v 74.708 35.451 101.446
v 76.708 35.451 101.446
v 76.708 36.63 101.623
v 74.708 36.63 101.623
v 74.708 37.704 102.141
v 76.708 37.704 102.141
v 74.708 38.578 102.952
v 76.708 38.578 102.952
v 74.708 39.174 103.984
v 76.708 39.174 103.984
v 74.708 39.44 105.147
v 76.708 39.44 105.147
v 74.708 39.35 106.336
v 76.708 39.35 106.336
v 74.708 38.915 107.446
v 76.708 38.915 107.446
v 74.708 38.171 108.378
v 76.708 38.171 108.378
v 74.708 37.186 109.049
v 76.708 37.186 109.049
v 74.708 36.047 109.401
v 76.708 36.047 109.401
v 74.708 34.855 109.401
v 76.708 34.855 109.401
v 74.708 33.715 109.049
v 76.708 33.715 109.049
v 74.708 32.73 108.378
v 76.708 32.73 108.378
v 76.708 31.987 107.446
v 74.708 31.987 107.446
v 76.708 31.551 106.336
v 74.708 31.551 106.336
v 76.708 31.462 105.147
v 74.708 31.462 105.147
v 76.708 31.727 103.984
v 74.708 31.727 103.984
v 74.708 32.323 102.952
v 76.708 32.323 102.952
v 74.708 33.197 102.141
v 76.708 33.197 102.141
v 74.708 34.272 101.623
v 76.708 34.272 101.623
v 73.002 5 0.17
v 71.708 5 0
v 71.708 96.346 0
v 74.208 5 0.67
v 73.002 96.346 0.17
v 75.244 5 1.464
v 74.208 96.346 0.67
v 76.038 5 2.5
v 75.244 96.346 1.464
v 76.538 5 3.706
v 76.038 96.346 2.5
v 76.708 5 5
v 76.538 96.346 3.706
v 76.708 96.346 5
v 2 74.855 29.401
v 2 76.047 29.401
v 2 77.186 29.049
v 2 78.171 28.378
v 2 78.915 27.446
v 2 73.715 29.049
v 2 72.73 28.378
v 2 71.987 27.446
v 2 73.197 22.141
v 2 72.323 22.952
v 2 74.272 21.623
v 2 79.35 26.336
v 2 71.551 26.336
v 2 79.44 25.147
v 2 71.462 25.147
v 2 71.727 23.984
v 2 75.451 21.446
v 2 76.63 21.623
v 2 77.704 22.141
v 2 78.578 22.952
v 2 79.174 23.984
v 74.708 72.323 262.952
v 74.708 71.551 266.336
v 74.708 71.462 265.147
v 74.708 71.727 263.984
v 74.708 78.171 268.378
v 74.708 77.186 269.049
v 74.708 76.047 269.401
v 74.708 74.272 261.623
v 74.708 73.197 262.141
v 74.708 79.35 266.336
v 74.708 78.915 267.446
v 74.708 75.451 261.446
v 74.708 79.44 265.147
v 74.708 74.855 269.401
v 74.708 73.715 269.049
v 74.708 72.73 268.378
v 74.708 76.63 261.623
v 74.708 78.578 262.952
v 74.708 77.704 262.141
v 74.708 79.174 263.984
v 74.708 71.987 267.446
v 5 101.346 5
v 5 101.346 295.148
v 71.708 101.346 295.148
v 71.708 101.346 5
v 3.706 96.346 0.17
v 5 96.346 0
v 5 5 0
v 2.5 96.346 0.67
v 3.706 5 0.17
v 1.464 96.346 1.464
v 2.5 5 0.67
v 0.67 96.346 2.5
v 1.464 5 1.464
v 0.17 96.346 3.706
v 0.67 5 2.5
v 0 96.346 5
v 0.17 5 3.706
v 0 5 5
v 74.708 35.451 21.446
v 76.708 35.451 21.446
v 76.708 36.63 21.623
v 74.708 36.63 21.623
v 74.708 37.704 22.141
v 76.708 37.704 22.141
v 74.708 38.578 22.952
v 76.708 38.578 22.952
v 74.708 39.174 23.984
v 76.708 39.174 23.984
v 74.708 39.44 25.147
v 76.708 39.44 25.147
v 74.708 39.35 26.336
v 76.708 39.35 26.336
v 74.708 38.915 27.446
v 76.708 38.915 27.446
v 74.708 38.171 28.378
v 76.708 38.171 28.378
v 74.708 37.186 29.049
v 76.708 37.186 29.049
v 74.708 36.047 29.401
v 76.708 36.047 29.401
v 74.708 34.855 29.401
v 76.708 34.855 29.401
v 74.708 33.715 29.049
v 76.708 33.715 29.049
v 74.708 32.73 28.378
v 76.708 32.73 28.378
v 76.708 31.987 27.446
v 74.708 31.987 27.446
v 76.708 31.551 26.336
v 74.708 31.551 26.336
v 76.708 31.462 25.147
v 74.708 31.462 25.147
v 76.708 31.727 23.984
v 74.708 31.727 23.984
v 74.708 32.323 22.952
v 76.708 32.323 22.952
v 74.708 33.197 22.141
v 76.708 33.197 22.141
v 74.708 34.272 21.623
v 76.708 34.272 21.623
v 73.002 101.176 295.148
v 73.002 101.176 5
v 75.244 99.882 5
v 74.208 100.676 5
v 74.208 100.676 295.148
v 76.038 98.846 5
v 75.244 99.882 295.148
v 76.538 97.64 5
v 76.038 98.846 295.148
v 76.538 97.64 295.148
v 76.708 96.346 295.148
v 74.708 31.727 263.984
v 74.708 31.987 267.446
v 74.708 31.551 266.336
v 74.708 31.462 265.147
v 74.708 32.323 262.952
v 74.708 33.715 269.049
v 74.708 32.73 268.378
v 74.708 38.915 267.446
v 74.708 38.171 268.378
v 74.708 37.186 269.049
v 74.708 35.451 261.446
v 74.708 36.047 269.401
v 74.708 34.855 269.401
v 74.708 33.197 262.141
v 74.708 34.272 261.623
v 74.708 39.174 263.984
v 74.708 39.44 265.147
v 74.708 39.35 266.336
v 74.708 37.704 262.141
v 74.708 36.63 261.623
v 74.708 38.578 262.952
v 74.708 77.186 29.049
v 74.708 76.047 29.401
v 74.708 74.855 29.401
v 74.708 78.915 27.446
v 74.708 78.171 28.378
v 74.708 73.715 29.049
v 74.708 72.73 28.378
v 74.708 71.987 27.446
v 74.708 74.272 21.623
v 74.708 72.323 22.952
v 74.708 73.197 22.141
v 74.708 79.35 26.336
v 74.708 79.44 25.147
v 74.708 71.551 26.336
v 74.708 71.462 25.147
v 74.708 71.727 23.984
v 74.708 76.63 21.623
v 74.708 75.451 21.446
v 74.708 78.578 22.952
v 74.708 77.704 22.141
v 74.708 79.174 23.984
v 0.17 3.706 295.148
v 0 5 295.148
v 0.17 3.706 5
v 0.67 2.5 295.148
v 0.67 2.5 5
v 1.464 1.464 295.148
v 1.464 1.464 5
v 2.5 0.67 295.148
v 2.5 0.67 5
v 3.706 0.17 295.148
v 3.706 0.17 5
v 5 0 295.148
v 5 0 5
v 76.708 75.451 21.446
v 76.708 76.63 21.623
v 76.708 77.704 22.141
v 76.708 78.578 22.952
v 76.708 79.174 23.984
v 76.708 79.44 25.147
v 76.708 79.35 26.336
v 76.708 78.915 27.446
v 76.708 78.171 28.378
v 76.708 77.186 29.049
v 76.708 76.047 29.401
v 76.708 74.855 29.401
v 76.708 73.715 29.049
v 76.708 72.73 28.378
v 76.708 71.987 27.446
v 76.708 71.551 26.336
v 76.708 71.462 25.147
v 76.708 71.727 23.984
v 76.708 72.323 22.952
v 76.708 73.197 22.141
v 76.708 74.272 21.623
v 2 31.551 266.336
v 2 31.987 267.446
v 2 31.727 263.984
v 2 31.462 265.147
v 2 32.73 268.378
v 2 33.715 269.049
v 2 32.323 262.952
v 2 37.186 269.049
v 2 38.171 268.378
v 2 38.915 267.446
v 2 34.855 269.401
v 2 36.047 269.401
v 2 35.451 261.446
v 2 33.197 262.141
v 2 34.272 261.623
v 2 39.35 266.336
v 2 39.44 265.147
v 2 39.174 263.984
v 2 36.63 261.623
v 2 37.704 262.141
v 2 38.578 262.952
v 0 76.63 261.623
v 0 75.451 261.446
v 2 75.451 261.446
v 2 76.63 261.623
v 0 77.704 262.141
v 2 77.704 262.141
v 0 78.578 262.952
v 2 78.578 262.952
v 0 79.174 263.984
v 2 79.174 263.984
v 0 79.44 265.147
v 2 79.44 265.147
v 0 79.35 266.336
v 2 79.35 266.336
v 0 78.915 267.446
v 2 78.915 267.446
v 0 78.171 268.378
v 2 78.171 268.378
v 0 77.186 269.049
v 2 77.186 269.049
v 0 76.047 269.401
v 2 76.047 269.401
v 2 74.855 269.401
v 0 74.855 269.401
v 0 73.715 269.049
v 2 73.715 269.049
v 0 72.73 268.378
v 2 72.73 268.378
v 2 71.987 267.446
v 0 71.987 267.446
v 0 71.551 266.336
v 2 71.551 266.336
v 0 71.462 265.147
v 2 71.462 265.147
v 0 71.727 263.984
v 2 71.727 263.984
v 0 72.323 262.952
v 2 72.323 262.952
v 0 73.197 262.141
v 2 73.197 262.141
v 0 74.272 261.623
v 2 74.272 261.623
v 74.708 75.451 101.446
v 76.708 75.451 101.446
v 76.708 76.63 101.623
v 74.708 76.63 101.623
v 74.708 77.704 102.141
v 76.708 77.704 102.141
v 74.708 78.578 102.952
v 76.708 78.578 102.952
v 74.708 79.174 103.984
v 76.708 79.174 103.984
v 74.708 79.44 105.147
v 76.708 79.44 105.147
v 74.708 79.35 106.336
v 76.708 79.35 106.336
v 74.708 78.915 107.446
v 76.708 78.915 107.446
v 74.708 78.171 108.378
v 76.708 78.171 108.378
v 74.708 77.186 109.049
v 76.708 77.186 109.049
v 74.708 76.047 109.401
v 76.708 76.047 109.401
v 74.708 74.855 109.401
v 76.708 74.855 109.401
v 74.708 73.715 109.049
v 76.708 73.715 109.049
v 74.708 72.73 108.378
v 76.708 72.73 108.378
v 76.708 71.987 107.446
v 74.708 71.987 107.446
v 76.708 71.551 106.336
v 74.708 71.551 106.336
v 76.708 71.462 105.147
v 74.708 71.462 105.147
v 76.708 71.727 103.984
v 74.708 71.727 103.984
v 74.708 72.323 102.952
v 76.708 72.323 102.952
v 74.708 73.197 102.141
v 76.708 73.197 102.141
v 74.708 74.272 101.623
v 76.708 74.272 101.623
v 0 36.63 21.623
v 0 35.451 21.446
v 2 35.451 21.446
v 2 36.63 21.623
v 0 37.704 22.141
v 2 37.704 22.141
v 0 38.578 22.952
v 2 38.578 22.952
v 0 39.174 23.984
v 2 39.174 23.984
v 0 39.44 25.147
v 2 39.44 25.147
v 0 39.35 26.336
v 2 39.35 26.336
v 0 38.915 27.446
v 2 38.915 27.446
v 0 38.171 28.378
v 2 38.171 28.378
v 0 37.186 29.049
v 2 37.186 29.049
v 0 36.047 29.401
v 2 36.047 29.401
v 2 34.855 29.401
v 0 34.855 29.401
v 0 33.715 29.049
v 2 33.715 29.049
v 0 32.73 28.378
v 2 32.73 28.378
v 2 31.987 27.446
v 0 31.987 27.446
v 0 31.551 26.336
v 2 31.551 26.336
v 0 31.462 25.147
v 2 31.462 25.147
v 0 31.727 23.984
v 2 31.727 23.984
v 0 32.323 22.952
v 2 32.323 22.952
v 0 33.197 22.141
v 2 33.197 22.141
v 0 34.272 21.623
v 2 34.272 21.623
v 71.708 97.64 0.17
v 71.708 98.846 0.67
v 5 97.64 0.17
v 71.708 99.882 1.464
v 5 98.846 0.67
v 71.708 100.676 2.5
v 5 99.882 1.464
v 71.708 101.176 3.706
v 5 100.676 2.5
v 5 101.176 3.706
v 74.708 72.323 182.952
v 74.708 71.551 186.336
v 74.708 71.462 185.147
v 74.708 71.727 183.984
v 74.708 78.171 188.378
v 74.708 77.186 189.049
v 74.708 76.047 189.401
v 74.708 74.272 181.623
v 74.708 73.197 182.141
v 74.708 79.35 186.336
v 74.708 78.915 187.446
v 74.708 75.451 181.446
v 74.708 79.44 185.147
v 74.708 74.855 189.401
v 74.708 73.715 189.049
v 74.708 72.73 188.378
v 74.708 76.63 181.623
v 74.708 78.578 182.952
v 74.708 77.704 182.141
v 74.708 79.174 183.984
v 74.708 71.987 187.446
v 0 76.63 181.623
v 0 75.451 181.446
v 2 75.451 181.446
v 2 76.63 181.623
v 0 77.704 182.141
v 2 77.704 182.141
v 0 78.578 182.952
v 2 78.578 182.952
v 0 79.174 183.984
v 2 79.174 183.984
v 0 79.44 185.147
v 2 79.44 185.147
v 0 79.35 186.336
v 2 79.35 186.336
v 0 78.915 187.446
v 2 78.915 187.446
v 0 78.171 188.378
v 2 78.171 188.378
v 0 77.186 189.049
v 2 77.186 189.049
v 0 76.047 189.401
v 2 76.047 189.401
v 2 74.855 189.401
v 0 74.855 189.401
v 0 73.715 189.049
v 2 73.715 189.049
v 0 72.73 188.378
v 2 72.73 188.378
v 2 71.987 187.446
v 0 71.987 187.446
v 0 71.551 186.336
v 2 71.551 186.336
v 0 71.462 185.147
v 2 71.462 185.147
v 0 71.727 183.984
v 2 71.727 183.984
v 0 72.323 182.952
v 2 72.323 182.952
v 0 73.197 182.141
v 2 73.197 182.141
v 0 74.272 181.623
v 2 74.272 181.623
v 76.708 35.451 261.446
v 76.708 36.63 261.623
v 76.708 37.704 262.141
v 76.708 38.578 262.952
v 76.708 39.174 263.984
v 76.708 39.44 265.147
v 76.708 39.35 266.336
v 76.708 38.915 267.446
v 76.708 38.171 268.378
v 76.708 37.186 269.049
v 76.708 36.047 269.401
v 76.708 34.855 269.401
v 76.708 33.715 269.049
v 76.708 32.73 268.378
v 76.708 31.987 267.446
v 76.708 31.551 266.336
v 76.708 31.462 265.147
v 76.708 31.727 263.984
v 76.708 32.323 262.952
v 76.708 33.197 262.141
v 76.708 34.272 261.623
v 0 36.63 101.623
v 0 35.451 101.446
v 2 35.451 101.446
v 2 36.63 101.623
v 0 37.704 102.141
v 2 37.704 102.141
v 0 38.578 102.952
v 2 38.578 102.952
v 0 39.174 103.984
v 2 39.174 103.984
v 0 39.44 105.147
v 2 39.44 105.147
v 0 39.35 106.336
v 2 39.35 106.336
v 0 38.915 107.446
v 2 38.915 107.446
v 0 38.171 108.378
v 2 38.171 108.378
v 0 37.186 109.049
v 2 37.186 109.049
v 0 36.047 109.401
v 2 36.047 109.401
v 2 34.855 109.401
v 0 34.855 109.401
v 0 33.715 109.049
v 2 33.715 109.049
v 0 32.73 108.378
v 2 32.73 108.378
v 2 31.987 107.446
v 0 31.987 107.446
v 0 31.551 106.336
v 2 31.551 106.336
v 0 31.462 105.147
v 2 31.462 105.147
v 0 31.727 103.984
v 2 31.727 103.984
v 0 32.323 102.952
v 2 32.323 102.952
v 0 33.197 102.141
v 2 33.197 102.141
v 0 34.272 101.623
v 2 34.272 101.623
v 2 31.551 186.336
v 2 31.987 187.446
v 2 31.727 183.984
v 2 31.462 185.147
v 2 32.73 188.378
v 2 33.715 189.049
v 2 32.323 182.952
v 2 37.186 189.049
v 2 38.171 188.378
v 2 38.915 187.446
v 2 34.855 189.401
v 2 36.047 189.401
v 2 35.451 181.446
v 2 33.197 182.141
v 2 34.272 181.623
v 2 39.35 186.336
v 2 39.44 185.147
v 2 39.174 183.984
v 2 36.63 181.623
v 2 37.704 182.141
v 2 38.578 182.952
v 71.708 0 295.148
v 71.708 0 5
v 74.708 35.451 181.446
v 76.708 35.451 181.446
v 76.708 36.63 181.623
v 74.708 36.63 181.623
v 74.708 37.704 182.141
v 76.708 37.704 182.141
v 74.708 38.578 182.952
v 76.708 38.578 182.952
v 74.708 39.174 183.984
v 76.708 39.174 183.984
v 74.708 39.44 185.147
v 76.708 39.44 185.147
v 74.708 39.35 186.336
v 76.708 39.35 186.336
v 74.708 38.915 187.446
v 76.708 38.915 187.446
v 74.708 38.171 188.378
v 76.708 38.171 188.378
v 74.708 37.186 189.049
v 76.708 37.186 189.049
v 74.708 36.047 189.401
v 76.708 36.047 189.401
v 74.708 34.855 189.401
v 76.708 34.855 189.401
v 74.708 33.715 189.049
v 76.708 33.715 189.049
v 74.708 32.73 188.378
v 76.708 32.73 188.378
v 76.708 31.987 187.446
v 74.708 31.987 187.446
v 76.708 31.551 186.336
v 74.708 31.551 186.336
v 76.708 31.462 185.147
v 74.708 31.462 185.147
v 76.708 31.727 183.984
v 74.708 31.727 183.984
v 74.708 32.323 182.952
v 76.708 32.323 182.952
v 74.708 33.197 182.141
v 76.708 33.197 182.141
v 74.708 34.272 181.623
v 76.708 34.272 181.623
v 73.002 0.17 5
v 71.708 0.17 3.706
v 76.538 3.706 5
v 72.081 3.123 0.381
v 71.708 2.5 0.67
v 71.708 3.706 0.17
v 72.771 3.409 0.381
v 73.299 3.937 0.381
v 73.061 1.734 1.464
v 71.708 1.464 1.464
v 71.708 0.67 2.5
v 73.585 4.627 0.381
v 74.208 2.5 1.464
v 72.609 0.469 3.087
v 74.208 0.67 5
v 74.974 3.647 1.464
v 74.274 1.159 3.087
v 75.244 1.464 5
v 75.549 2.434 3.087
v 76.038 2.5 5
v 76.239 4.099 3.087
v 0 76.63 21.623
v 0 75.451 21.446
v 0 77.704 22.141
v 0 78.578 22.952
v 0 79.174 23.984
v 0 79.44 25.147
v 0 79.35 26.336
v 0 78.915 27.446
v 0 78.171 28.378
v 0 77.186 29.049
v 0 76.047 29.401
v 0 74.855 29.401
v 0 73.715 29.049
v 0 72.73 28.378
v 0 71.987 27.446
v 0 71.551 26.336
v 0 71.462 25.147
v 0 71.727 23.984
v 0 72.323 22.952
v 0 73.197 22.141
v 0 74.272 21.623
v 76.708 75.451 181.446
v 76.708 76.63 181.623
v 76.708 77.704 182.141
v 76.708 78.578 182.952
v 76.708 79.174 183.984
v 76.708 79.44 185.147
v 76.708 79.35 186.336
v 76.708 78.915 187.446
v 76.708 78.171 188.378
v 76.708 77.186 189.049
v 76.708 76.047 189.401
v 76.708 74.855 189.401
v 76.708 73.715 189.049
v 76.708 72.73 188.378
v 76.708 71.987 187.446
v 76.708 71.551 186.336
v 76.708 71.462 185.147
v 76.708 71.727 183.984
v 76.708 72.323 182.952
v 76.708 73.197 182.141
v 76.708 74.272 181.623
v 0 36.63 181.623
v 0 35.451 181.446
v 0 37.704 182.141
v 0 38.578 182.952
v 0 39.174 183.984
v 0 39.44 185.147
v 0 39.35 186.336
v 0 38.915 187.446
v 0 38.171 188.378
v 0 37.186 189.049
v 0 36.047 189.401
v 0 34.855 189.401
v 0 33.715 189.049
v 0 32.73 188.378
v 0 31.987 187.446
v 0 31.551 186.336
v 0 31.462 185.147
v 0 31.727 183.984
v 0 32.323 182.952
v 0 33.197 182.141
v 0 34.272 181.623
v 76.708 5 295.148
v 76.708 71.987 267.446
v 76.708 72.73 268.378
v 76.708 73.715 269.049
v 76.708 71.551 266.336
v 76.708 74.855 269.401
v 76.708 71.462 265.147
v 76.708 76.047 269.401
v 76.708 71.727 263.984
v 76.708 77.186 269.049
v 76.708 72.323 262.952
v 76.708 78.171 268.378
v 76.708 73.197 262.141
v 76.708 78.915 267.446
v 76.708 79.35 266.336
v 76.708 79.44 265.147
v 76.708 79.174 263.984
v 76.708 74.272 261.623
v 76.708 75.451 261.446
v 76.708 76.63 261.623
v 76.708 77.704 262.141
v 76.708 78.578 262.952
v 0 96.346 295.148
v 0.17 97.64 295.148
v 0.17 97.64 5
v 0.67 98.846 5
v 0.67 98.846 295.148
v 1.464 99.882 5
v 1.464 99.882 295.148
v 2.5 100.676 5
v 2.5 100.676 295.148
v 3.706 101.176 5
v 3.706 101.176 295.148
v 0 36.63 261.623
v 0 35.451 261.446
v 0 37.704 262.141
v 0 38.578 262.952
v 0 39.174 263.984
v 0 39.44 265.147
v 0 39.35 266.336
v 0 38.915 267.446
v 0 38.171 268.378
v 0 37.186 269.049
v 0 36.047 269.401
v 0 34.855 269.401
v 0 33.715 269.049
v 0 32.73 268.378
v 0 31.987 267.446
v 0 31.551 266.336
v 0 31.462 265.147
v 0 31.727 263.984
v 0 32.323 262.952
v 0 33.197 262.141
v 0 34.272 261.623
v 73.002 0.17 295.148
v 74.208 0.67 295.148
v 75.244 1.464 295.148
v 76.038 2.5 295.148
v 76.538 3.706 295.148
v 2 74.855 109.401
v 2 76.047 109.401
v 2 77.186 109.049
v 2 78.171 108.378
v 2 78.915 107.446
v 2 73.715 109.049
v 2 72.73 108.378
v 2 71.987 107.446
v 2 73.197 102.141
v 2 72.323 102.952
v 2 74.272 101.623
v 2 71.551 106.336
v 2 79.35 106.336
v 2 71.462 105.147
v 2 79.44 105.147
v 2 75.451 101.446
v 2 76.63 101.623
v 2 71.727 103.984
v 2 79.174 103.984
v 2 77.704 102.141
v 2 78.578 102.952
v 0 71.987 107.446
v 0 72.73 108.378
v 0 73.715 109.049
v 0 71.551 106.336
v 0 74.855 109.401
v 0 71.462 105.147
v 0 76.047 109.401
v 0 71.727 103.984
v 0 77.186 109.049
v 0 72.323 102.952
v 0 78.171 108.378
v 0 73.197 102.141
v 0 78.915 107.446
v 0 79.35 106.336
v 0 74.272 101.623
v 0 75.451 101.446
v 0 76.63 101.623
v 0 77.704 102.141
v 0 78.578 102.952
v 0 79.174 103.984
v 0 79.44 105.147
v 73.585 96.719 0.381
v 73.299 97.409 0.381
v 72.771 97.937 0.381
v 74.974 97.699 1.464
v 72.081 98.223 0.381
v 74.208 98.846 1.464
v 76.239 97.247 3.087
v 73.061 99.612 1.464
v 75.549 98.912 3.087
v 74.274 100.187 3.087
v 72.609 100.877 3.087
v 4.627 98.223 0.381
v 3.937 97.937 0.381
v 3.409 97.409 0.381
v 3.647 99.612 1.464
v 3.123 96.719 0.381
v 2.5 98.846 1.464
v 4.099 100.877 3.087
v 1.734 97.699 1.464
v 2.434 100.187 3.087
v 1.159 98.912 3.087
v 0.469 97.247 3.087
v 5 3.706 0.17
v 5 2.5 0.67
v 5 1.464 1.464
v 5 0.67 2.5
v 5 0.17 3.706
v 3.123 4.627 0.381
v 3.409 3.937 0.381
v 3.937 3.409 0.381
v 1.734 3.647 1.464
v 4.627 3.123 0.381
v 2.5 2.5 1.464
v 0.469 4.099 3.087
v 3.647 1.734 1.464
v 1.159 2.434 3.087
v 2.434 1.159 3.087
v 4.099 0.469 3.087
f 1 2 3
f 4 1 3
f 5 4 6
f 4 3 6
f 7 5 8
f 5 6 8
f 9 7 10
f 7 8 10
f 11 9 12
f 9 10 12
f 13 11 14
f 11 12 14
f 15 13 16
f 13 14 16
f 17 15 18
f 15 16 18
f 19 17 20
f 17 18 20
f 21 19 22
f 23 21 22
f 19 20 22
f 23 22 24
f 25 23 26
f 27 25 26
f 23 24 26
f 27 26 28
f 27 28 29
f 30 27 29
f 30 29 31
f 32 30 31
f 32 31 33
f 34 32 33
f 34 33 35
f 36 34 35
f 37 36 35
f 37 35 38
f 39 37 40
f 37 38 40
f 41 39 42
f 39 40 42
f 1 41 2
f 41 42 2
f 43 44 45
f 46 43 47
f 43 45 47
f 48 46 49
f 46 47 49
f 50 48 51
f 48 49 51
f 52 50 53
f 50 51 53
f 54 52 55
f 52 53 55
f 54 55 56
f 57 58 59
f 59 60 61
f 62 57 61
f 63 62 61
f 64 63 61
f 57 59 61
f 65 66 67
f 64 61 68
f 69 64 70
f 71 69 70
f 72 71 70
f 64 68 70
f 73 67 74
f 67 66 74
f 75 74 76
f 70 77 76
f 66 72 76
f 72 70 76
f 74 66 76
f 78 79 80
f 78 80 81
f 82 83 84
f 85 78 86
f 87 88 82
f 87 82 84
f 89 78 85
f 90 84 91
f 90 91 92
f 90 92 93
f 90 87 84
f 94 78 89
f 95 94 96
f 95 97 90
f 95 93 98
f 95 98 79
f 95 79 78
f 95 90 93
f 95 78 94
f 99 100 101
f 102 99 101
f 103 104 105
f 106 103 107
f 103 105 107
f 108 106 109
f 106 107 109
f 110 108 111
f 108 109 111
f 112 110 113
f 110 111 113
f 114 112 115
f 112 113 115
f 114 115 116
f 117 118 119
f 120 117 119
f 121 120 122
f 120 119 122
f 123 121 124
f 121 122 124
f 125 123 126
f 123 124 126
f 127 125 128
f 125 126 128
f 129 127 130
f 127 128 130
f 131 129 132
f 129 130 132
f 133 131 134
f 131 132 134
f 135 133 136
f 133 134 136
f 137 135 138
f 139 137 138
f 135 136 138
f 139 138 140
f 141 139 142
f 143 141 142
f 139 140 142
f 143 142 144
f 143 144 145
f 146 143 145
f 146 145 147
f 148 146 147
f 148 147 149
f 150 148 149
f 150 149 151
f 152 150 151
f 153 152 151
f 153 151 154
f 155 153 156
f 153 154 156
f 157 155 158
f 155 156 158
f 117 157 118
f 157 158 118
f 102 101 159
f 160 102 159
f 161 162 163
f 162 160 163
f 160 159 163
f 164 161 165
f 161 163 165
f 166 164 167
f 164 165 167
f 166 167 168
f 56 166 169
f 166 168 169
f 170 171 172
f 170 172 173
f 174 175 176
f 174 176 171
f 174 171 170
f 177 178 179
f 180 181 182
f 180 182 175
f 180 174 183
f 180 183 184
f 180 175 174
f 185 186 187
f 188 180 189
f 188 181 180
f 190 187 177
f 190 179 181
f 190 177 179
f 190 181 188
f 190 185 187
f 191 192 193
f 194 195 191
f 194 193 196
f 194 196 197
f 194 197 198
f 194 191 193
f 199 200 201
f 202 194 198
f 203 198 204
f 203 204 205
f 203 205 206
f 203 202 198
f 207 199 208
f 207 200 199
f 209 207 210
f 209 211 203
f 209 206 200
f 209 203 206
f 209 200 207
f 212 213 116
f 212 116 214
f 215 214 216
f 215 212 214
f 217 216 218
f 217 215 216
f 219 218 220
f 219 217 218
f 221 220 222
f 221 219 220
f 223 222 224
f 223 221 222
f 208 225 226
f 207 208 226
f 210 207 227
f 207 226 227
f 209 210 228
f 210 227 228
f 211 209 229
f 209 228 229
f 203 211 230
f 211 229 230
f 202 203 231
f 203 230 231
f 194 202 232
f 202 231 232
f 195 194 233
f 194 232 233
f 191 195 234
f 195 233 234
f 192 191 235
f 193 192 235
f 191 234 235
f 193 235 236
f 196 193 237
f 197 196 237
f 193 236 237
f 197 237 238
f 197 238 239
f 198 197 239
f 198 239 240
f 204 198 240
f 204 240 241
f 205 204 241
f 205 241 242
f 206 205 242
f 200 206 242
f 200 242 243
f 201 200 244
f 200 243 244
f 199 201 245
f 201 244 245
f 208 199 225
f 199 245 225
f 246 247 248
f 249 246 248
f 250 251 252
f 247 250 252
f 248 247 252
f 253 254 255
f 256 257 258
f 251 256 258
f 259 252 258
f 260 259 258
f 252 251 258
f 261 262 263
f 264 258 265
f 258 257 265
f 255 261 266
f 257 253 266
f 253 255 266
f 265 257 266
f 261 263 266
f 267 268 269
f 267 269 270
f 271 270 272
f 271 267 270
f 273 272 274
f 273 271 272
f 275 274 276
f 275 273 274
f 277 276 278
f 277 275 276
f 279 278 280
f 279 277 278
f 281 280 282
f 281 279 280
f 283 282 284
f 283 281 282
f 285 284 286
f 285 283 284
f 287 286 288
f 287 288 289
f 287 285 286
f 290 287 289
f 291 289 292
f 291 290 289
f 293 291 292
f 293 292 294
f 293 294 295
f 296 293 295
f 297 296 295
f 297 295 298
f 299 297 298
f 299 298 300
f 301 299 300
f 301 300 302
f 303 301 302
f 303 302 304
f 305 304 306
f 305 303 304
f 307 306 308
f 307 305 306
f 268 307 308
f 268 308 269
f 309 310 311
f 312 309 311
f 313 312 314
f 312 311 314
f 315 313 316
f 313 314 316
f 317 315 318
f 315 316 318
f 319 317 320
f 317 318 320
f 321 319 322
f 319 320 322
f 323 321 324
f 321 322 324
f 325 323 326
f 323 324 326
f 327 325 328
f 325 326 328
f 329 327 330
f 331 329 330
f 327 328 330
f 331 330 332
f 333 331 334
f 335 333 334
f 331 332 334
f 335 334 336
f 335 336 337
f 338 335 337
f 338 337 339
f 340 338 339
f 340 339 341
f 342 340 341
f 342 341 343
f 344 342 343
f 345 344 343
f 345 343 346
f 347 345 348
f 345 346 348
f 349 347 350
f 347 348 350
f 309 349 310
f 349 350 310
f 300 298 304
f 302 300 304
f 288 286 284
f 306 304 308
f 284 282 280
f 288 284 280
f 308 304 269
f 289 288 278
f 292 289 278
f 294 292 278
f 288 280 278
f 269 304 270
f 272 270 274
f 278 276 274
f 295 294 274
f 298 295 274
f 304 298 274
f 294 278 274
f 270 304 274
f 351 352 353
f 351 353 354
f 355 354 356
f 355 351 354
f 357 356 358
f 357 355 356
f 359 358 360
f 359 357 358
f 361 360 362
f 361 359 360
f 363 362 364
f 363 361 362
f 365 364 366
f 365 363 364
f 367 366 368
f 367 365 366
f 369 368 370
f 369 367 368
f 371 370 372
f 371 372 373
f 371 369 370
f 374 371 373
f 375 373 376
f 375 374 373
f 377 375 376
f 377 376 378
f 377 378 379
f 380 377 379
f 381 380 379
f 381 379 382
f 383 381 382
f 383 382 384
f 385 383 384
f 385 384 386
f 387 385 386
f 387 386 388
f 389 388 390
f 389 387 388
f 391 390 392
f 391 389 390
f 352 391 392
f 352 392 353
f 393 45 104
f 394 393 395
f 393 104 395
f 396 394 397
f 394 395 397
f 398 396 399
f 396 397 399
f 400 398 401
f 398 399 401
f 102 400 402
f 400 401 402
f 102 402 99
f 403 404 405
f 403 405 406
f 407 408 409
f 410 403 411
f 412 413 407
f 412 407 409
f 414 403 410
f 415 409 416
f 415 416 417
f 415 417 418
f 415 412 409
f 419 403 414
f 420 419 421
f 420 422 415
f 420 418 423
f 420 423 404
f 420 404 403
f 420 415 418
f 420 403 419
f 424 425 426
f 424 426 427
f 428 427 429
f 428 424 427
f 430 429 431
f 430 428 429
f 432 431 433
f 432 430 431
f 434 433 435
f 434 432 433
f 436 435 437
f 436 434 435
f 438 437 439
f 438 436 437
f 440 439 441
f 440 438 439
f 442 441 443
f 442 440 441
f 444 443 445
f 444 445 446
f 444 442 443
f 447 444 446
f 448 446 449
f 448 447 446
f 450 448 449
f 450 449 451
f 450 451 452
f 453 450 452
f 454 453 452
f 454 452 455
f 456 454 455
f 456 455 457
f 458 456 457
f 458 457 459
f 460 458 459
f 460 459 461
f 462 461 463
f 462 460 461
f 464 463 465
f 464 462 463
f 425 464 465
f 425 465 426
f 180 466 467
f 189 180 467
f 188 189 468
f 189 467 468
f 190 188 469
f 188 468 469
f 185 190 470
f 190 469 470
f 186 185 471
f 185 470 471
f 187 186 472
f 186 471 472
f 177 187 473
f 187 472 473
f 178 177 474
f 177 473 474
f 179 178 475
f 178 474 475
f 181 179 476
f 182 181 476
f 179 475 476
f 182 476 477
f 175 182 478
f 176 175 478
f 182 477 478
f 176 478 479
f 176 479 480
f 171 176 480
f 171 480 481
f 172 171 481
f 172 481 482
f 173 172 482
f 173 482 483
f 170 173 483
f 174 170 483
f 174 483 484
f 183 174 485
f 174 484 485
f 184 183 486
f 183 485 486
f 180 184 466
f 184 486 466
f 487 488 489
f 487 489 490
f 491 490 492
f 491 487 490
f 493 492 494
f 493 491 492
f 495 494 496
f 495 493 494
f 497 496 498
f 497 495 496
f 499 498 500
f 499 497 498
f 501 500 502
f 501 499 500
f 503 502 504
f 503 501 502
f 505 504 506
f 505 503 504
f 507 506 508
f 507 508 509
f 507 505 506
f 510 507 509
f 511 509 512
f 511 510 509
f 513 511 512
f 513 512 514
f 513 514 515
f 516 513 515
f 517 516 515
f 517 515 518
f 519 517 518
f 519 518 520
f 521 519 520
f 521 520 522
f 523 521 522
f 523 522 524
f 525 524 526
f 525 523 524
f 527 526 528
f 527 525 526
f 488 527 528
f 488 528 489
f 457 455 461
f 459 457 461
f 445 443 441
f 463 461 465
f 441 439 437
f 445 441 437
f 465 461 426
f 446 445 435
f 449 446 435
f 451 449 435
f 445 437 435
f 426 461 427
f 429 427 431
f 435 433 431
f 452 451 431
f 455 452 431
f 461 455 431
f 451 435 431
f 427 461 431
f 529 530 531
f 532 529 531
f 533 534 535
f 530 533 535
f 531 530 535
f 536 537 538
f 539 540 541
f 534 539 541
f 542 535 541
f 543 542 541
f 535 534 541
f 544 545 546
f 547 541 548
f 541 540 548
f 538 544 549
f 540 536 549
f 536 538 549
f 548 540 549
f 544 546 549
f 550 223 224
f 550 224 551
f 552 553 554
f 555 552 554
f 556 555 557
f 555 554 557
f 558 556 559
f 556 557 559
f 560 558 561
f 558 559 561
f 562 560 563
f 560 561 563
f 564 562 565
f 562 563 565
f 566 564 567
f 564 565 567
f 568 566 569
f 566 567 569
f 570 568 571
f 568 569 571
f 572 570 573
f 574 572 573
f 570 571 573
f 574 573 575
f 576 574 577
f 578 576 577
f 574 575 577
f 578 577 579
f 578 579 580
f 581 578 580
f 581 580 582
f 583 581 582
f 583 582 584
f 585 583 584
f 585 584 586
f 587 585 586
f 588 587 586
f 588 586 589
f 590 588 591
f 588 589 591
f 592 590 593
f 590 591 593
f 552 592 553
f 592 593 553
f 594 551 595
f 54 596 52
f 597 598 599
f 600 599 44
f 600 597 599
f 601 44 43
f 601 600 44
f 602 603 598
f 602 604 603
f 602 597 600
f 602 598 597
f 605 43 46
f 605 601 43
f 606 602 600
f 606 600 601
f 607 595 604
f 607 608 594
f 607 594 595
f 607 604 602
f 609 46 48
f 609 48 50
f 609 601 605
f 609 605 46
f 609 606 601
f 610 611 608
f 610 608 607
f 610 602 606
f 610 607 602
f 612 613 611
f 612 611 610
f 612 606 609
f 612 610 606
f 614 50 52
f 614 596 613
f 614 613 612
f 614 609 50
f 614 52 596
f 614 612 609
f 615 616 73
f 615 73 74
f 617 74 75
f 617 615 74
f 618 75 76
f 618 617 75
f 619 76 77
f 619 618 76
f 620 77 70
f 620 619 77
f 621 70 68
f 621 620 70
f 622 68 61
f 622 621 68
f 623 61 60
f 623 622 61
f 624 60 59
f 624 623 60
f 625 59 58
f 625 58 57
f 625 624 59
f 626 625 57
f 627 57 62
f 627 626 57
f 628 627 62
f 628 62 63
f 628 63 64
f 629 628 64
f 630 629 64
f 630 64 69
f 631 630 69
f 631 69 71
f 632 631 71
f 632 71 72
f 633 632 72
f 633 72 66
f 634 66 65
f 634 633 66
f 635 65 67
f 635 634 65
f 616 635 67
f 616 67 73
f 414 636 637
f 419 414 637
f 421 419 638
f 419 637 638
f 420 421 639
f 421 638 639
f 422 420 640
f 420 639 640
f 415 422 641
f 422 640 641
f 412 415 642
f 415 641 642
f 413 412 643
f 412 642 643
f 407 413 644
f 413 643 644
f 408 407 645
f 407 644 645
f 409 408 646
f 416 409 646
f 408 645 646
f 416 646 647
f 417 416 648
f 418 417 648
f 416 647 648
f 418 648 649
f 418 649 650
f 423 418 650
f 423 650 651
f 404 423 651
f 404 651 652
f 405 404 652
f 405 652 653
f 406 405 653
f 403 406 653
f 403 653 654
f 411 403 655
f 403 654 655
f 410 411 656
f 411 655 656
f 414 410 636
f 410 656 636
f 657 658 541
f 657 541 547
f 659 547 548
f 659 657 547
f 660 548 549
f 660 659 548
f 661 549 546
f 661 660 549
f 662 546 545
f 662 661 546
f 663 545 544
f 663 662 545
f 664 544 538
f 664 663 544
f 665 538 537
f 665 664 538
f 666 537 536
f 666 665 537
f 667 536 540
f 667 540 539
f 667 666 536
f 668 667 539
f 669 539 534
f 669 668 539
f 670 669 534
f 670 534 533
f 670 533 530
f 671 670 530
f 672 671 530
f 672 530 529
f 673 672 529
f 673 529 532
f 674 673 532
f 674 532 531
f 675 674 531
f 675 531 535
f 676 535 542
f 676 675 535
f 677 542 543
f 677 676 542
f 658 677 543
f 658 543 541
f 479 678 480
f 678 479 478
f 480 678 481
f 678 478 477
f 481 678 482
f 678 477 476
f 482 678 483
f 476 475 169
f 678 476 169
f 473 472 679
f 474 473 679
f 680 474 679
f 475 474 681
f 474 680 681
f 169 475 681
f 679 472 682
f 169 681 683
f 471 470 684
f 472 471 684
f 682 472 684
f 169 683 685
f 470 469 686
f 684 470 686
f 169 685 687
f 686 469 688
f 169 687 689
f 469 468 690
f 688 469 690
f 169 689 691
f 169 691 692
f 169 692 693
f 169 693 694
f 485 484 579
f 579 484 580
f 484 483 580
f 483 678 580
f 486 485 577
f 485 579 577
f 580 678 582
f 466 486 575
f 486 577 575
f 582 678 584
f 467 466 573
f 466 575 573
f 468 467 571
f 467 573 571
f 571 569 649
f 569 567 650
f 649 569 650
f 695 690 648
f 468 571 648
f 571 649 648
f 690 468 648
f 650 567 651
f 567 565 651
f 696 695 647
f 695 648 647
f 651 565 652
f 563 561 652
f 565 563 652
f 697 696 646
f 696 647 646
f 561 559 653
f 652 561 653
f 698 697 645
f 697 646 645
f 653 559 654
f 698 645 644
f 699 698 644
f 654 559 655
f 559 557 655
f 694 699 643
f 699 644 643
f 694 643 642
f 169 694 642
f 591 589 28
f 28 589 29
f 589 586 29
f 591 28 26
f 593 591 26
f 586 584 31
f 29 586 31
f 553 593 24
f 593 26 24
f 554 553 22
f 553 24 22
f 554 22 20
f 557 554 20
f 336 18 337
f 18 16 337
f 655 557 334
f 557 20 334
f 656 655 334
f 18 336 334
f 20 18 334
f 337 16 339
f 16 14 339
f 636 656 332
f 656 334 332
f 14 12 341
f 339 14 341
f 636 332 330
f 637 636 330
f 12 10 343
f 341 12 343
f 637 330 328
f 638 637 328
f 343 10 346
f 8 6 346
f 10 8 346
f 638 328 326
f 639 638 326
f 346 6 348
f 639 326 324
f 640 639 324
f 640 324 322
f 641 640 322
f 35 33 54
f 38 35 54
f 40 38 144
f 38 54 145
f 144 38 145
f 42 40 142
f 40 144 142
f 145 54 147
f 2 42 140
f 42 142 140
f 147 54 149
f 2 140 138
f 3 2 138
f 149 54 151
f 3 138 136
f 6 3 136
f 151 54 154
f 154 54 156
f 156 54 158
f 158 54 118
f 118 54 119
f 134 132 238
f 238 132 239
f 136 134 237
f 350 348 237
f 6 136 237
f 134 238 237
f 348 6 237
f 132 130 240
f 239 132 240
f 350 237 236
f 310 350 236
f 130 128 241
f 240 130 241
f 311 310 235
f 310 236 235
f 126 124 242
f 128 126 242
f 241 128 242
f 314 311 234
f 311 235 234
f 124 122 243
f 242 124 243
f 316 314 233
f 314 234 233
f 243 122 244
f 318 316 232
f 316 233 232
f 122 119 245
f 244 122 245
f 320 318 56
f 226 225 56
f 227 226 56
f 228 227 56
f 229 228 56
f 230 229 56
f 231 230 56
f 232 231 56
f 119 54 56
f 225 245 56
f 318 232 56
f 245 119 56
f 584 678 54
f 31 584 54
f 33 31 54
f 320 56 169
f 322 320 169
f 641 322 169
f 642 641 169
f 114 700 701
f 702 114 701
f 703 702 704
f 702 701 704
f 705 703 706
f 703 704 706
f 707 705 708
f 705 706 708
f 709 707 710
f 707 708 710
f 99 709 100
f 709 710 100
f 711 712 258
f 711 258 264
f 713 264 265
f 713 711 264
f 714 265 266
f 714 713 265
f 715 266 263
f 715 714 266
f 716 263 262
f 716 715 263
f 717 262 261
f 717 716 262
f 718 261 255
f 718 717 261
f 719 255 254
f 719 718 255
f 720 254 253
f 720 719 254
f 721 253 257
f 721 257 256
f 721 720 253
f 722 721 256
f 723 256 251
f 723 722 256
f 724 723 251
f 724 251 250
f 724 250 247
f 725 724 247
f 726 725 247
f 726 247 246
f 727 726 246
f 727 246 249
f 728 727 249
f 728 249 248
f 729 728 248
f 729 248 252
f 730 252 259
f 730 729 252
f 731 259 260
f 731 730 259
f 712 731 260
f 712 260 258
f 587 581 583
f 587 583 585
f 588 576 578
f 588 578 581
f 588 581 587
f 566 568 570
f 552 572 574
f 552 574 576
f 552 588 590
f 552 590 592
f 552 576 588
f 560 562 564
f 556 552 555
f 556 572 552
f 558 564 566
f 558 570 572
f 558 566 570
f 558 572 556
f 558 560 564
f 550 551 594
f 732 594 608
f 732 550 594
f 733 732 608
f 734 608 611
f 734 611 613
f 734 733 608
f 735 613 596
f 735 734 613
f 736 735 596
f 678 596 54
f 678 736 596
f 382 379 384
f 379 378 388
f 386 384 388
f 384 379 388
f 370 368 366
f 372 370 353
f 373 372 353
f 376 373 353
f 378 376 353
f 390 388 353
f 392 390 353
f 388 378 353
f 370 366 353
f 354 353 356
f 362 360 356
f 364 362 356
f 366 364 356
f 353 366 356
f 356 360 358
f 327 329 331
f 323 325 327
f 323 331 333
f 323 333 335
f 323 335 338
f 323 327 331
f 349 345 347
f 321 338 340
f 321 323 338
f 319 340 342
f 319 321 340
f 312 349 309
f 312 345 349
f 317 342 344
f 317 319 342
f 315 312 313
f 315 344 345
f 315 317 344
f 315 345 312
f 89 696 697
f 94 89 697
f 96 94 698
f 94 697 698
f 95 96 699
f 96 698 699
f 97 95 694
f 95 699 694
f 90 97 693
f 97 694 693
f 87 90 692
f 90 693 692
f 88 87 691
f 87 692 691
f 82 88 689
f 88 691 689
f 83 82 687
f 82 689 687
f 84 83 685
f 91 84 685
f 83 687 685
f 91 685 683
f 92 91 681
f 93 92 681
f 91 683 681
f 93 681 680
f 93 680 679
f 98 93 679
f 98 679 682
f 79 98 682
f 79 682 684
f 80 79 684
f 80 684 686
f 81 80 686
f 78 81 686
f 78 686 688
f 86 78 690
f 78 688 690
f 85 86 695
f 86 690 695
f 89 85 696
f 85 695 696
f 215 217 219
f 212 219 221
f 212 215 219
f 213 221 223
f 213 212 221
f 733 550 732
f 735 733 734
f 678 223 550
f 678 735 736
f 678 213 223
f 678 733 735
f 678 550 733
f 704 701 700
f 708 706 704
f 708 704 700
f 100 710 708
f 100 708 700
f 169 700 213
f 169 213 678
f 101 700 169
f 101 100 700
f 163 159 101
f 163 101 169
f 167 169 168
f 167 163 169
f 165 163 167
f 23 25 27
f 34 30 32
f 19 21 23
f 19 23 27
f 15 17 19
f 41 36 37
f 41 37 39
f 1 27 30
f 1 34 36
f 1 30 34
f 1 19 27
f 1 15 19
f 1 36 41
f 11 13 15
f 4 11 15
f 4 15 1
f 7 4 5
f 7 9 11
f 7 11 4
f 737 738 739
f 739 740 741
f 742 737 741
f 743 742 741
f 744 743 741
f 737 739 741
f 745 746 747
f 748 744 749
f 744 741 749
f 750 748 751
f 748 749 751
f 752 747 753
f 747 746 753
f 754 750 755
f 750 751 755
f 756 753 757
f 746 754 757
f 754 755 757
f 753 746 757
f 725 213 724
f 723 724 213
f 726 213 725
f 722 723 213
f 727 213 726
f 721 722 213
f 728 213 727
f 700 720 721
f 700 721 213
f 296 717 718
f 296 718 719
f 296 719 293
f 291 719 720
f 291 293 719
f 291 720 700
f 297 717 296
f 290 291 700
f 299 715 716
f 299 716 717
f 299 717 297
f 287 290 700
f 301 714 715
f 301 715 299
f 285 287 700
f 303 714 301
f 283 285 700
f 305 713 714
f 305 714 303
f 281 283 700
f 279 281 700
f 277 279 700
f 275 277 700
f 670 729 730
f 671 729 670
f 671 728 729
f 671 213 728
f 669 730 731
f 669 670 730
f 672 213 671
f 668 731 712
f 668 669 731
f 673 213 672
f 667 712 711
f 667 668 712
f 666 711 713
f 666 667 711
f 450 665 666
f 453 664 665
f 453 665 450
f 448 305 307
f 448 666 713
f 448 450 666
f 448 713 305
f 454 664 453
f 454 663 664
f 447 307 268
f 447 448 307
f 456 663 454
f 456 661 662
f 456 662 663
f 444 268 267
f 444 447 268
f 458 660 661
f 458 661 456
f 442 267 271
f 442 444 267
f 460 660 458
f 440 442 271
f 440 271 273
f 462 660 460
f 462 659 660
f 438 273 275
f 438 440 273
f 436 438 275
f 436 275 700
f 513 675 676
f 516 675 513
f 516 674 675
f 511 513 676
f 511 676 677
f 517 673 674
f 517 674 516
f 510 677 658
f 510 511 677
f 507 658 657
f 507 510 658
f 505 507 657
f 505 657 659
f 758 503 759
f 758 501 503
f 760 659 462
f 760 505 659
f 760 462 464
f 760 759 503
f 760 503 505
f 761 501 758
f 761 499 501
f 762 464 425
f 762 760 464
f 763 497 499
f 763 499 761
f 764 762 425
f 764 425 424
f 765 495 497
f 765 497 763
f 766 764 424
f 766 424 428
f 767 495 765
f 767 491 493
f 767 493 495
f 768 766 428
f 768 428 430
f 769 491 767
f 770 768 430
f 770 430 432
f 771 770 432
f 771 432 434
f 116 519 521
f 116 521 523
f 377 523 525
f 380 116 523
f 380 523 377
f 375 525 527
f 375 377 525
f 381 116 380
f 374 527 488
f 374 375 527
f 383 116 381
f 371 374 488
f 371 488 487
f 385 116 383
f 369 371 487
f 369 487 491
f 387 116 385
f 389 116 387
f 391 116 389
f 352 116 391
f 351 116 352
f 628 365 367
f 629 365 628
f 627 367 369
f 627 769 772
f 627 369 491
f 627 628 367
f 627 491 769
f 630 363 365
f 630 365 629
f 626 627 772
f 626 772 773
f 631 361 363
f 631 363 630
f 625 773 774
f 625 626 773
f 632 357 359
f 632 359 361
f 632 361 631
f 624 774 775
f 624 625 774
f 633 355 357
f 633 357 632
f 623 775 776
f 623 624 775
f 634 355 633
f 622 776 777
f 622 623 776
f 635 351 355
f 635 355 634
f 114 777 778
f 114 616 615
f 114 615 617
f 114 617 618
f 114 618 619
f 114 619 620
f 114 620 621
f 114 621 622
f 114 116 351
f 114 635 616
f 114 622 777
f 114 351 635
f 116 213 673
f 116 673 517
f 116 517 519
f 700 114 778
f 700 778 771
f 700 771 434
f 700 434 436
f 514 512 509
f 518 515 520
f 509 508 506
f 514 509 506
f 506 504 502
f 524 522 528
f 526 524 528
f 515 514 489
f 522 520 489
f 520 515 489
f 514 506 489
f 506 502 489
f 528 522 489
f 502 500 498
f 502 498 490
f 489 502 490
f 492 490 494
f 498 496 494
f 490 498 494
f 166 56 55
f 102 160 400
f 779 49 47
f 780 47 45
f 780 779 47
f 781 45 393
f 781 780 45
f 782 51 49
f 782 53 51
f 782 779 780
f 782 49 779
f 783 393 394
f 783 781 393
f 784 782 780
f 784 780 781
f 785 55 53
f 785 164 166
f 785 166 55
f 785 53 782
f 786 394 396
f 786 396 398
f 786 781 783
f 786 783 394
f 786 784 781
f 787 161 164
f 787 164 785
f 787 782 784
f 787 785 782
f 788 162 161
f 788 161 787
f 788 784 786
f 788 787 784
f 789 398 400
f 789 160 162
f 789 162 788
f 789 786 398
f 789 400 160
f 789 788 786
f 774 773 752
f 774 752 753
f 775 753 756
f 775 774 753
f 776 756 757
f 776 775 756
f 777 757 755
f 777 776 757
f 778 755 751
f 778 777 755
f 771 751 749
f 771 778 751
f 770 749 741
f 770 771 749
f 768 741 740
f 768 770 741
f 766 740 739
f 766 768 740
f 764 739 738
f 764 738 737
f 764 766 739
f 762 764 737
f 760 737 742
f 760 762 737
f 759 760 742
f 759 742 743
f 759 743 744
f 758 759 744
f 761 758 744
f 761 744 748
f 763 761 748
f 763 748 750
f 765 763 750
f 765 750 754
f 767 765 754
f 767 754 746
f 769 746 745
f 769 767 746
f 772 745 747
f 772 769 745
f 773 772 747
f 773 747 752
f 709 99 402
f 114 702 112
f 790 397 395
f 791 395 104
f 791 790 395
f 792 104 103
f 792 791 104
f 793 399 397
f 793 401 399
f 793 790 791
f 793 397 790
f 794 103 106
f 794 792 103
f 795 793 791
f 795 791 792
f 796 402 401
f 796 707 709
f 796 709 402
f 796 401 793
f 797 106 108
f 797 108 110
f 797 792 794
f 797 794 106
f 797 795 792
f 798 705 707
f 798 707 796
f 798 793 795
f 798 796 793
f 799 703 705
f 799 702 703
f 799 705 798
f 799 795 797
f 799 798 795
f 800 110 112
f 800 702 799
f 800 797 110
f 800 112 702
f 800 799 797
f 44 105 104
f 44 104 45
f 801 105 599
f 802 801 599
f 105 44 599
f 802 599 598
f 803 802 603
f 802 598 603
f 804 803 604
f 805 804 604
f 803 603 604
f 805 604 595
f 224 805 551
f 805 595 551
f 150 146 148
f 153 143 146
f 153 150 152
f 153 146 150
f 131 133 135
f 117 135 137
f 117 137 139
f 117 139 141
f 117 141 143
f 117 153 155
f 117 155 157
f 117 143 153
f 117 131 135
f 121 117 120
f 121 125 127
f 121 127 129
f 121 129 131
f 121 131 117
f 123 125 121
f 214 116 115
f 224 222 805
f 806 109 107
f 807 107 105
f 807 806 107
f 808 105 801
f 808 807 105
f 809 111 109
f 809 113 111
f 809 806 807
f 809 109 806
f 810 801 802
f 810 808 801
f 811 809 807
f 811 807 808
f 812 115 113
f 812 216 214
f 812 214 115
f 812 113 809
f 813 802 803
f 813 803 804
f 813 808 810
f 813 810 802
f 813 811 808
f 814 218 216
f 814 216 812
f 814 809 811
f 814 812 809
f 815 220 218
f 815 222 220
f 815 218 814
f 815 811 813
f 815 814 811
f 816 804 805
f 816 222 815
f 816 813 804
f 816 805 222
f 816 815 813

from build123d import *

# Parameters (mm, degrees)
SKETCH2_W           = 76.708
SKETCH2_H           = 101.346
BOSS_EXTRUDE1_DEPTH = 295.148
SKETCH3_R           = 4
CUT_EXTRUDE1_DEPTH  = 2
FILLET1_R           = 5
FILLET2_R           = 5


with BuildPart() as part:
    # Sketch2 → Boss-Extrude1 (new body)
    with BuildSketch(Plane.XY):
        with Locations((38.354, 50.673)):
            Rectangle(SKETCH2_W, SKETCH2_H)
    extrude(amount=BOSS_EXTRUDE1_DEPTH)

    # Sketch3 → Cut-Extrude1 (cut)
    with BuildSketch(Plane(origin=(76.708, 0, 0), x_dir=(0, 0, -1), z_dir=(1, 0, 0))):
        with Locations((-265.445597479, 75.450765932)):
            Circle(SKETCH3_R)
        with Locations((-185.445597479, 75.450765932)):
            Circle(SKETCH3_R)
        with Locations((-105.445597479, 75.450765932)):
            Circle(SKETCH3_R)
        with Locations((-25.445597479, 75.450765932)):
            Circle(SKETCH3_R)
        with Locations((-185.445597479, 35.450765932)):
            Circle(SKETCH3_R)
        with Locations((-105.445597479, 35.450765932)):
            Circle(SKETCH3_R)
        with Locations((-25.445597479, 35.450765932)):
            Circle(SKETCH3_R)
        with Locations((-265.445597479, 35.450765932)):
            Circle(SKETCH3_R)
    cut_extrude1 = extrude(amount=-CUT_EXTRUDE1_DEPTH, mode=Mode.SUBTRACT)

    # Mirror1: Cut-Extrude1 across plane
    add(cut_extrude1.mirror(Plane.ZY.offset(-38.354)), mode=Mode.SUBTRACT)

    # Fillet1
    fillet1_edges = [part.edges().sort_by_distance(p)[0] for p in [
        (0, 101.346, 147.574),
        (76.708, 101.346, 147.574),
        (76.708, 0, 147.574),
        (0, 0, 147.574),
    ]]
    fillet(fillet1_edges, radius=FILLET1_R)

    # Fillet2
    fillet2_edges = [part.edges().sort_by_distance(p)[0] for p in [
        (38.354, 0, 0),
        (0, 50.673, 0),
        (38.354, 101.346, 0),
        (76.708, 50.673, 0),
        (1.464466094, 99.881533906, 0),
        (75.243533906, 99.881533906, 0),
        (75.243533906, 1.464466094, 0),
        (1.464466094, 1.464466094, 0),
    ]]
    fillet(fillet2_edges, radius=FILLET2_R)


solid = part.part
